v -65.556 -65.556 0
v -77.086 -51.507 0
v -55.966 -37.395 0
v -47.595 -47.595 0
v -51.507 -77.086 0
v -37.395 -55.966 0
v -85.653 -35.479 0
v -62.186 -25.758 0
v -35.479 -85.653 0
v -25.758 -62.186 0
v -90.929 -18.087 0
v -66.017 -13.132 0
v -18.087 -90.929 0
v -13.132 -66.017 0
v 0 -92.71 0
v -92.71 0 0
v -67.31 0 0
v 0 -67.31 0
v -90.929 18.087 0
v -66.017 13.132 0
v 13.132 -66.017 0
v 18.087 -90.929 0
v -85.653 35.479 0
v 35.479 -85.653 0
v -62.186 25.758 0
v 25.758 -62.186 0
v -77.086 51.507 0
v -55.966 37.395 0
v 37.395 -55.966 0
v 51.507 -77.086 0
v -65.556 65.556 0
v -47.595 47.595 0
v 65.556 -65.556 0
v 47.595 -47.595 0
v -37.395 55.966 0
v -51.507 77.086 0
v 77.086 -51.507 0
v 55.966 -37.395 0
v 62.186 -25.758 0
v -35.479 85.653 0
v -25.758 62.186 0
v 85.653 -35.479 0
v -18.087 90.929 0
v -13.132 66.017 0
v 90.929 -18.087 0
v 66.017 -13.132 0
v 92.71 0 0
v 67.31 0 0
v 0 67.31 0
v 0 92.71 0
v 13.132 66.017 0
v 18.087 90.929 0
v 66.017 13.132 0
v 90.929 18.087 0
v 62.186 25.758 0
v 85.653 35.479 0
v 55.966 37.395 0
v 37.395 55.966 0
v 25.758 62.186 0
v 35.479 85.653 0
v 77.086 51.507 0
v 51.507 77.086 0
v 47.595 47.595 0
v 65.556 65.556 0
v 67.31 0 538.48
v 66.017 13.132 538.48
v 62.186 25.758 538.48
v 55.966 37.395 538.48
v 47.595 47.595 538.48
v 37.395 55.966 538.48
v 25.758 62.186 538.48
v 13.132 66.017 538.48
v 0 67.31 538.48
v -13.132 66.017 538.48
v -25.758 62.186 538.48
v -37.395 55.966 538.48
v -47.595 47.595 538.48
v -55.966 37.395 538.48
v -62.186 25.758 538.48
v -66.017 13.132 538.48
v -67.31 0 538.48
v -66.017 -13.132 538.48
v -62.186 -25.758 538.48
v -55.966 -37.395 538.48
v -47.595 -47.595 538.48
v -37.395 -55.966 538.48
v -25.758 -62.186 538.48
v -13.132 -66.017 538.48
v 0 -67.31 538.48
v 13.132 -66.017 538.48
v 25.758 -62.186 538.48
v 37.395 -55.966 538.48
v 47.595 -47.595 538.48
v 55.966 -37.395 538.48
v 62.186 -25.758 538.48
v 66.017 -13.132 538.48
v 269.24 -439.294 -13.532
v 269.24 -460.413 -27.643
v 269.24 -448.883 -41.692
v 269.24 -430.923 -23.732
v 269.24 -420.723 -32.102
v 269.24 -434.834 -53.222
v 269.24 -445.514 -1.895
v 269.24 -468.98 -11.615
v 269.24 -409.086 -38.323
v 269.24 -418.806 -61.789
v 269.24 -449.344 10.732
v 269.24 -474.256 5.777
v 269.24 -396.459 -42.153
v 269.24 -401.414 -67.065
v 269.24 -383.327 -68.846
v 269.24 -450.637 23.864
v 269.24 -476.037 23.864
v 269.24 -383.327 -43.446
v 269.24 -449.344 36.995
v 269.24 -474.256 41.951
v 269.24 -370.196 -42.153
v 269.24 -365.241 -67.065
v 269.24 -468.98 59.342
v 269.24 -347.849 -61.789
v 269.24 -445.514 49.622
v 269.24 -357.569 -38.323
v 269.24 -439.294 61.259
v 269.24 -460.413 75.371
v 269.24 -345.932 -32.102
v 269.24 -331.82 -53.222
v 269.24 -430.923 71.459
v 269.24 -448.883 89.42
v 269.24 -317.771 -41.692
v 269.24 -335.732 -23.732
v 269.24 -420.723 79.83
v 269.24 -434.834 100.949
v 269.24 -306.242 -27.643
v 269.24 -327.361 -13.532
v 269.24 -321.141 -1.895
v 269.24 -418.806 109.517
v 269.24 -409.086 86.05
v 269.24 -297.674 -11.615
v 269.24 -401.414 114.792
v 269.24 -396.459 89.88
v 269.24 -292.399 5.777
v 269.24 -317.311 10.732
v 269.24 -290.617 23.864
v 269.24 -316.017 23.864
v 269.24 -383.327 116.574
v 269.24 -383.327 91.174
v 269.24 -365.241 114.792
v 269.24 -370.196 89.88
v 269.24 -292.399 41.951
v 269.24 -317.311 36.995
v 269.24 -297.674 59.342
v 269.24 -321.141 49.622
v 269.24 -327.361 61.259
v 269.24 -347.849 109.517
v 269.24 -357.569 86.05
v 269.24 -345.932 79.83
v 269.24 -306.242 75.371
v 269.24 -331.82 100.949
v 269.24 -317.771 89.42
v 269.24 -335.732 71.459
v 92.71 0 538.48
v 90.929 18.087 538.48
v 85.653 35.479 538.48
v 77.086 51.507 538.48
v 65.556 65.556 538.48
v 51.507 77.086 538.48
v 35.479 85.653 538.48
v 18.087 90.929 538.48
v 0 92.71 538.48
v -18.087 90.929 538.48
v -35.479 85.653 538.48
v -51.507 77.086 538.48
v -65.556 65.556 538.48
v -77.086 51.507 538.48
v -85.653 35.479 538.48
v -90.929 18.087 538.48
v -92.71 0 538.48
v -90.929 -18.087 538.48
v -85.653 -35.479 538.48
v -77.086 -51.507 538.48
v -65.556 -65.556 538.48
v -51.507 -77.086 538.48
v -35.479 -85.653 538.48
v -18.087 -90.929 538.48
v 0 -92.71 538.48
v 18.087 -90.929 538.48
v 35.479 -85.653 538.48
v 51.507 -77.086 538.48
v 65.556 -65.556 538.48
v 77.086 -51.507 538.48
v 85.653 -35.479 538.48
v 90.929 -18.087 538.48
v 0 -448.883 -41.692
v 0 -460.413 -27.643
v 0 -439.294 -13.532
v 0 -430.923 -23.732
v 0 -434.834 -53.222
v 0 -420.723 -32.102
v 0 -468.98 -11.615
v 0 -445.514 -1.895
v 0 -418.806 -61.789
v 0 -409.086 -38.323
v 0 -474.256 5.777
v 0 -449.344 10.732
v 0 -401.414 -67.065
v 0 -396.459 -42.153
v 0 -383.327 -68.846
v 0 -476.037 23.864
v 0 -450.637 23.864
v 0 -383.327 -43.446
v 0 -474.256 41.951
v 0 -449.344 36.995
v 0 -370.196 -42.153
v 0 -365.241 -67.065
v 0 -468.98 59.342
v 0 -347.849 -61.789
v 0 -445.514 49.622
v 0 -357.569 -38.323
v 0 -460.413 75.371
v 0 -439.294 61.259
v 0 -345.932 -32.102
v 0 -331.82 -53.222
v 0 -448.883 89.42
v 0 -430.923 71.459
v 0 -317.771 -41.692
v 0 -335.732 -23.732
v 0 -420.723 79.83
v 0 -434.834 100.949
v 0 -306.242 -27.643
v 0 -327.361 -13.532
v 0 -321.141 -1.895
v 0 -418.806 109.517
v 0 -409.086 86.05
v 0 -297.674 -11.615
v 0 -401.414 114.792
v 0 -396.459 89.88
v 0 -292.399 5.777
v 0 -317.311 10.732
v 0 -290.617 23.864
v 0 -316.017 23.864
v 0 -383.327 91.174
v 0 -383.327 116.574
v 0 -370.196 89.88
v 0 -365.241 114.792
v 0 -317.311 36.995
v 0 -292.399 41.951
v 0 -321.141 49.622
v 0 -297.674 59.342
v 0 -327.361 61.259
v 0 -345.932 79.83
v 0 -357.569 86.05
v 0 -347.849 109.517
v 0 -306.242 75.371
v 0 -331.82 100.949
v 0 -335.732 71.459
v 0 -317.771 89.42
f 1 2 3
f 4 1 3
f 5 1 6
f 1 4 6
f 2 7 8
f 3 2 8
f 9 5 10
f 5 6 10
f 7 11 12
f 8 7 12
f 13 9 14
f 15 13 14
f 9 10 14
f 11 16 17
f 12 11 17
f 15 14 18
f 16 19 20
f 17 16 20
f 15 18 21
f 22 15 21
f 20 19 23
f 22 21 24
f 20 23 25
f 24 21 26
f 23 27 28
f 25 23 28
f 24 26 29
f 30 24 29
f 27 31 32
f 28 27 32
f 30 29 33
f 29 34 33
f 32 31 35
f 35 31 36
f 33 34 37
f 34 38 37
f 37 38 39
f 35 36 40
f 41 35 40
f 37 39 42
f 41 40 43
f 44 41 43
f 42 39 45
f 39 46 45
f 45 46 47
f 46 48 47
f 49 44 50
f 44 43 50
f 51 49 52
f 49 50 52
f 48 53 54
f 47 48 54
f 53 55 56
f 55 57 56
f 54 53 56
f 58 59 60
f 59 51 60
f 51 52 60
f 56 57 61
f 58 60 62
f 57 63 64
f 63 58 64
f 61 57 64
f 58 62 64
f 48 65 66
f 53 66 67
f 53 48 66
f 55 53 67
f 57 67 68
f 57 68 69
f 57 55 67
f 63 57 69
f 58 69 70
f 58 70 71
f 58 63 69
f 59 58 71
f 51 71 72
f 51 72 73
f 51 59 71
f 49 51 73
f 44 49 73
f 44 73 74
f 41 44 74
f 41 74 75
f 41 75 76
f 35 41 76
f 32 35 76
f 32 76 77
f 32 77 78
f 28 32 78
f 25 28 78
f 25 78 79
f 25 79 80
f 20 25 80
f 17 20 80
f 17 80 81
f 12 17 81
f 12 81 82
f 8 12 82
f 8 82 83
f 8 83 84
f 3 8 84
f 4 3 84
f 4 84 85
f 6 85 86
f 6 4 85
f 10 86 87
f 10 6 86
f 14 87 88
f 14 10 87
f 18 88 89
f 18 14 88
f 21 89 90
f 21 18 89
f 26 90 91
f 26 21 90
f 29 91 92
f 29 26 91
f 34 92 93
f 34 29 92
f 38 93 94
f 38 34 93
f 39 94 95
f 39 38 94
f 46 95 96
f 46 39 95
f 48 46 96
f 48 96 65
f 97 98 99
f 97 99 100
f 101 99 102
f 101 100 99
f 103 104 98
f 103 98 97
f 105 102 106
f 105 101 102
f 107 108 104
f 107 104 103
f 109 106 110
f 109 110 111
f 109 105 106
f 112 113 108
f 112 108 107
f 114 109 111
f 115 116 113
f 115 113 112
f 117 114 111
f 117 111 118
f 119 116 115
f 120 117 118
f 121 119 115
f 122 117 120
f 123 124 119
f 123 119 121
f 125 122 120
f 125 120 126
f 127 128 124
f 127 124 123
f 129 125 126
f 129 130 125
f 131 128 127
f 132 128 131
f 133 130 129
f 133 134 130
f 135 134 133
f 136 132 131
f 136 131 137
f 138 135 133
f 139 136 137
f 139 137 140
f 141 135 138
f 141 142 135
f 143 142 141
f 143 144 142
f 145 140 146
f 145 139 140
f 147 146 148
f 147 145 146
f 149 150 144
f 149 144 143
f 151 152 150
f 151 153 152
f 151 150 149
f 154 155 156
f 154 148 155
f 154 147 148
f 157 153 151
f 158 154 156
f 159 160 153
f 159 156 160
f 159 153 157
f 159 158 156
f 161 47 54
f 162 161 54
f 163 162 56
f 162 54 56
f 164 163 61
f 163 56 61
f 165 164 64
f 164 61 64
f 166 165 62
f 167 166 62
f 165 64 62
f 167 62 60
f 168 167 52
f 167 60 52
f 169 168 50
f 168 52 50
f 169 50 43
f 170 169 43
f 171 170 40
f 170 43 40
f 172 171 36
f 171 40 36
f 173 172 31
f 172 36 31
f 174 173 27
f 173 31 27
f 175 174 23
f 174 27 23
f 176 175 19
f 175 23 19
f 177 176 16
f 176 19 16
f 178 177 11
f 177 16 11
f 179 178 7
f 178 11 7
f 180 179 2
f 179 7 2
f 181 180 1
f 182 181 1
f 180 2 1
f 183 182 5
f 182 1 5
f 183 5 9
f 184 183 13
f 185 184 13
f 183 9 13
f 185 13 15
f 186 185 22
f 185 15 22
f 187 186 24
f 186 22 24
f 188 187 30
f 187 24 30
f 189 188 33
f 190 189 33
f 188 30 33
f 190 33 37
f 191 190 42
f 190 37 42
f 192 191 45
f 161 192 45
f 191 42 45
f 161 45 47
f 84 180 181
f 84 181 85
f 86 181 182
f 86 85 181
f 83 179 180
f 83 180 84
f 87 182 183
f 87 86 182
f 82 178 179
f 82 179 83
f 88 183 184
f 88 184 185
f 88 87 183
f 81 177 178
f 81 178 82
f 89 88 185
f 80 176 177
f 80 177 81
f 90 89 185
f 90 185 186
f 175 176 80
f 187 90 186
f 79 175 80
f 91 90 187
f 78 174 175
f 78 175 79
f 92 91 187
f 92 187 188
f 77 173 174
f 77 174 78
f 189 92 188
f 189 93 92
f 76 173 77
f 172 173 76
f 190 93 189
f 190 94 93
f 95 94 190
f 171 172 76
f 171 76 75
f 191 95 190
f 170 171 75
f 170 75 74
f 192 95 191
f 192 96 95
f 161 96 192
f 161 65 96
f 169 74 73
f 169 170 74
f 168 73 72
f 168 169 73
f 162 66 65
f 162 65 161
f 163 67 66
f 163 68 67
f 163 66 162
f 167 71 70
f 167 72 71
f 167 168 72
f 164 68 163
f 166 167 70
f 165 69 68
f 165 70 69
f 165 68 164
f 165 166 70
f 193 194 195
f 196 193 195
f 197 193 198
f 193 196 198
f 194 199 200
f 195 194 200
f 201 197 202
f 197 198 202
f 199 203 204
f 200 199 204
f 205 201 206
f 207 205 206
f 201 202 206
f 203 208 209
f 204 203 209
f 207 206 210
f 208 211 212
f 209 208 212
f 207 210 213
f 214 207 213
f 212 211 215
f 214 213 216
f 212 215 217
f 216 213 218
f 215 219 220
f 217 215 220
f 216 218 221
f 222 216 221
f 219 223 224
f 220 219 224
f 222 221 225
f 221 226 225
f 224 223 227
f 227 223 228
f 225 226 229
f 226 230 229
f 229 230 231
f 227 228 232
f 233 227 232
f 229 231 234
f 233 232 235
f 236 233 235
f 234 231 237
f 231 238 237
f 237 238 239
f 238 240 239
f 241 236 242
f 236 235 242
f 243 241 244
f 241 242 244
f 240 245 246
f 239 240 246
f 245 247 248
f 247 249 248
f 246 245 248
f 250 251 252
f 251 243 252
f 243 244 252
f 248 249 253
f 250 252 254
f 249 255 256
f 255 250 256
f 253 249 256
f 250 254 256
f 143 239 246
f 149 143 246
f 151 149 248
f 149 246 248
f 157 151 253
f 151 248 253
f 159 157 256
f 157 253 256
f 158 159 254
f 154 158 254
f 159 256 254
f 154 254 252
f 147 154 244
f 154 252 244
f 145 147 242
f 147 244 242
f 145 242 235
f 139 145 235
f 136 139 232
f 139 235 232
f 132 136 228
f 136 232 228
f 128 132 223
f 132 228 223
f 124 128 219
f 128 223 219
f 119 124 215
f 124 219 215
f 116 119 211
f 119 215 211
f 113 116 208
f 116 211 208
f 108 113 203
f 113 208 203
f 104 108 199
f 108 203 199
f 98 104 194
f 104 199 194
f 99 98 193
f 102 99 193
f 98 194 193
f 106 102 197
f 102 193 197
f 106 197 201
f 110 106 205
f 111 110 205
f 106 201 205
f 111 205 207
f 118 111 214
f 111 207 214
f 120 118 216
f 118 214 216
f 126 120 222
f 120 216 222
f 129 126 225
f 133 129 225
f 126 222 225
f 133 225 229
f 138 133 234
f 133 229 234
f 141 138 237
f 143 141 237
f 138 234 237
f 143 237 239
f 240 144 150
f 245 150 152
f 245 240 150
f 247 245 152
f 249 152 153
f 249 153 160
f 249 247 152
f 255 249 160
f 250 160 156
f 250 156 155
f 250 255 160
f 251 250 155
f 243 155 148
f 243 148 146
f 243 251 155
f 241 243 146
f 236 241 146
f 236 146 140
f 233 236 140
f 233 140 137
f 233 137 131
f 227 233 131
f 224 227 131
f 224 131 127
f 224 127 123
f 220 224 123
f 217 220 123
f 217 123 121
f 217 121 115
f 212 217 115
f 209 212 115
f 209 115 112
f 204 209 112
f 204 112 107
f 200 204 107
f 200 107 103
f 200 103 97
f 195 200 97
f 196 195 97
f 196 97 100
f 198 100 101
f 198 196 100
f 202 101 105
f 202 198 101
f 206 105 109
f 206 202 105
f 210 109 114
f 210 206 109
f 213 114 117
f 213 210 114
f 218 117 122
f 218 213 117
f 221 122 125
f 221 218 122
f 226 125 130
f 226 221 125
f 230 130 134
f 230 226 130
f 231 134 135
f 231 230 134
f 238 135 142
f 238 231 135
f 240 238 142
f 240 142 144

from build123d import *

# Parameters (mm, degrees)
F0_R     = 92.71
F1_DEPTH = 538.48
F2_R     = 92.71
F3_DEPTH = 269.24
F4_T     = -25.4
F4_2_T   = -25.4


with BuildPart() as f1:
    # F0 (on Top) → F1 (new body)
    with BuildSketch(Plane.XY):
        Circle(F0_R)
    extrude(amount=F1_DEPTH)

    # F4
    f4_openings = [f1.faces().sort_by_distance(p)[0] for p in [
        (0, 0, 538.48),
        (0, 0, 0),
    ]]
    offset(amount=F4_T, openings=f4_openings)


with BuildPart() as f3:
    # F2 (on Right) → F3 (new body)
    with BuildSketch(Plane.YZ):
        with Locations((-383.327335, 23.863822)):
            Circle(F2_R)
    extrude(amount=F3_DEPTH)

    # F4#2
    f4_2_openings = [f3.faces().sort_by_distance(p)[0] for p in [
        (269.24, -383.327335, 23.863822),
        (0, -383.327335, 23.863822),
    ]]
    offset(amount=F4_2_T, openings=f4_2_openings)


solid = Compound([f1.part, f3.part])
